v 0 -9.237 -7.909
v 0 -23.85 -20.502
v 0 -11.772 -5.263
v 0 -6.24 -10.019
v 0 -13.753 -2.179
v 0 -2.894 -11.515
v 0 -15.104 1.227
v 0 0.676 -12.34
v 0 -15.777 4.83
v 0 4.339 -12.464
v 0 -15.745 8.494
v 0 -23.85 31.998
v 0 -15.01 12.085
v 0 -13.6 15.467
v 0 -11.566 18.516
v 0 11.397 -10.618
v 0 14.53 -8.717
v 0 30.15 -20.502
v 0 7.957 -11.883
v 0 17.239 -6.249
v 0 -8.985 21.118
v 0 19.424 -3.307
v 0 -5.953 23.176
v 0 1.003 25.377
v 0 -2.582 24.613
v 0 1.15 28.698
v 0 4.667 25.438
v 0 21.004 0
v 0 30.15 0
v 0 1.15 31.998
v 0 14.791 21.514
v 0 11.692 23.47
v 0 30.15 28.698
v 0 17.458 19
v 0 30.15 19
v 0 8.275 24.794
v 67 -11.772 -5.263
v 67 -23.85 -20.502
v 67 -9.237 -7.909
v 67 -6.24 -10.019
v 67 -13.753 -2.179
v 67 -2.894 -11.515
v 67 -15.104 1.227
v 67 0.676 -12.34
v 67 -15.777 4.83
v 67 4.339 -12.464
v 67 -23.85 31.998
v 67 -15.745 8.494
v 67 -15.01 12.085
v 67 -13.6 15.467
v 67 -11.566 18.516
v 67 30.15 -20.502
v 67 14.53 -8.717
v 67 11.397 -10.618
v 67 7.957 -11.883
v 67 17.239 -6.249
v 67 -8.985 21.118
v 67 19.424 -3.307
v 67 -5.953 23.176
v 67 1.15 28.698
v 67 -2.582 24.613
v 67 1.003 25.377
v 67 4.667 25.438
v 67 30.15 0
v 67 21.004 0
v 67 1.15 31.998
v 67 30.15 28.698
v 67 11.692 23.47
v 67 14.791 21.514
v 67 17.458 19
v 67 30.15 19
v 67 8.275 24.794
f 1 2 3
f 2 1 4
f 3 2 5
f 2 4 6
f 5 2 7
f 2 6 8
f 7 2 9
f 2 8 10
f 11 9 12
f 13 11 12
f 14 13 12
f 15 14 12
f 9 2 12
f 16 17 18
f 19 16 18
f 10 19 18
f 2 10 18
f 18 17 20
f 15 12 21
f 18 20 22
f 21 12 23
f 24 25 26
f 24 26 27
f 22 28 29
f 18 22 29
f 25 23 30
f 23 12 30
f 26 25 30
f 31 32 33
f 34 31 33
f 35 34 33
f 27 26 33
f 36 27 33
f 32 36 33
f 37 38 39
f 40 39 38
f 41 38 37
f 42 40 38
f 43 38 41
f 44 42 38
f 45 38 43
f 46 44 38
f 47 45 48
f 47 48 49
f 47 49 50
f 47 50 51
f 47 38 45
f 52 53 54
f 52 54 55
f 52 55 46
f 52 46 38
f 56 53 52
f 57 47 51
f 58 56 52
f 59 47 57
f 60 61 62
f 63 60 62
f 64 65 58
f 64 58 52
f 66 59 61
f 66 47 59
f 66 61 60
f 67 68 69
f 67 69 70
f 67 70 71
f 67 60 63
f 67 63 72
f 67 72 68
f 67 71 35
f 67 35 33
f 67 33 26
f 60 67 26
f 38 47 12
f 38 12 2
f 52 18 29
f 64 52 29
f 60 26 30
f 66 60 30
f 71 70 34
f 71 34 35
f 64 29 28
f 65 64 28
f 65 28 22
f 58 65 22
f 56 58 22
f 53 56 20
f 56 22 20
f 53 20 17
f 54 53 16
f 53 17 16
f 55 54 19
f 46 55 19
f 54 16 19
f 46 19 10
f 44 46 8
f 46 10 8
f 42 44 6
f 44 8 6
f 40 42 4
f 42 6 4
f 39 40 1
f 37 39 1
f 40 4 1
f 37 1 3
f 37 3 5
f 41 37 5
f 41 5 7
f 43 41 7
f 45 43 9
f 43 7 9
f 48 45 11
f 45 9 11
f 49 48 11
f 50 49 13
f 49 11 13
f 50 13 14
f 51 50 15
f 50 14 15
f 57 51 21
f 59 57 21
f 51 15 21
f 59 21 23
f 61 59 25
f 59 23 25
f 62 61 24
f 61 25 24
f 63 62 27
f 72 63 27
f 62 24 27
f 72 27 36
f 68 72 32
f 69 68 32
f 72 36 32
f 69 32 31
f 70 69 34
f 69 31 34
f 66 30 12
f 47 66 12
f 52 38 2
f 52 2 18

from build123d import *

# Parameters (mm, degrees)
F1_DEPTH = 67


# Not quite as in the source:
# - a feature names something its author has since deleted; it is built from what else it names


with BuildPart() as f1:
    # F0 (on Right) → F1 (new body)
    with BuildSketch(Plane.YZ):
        with BuildLine():
            Line((-23.8500006944, 31.9984000194), (-23.8500006944, -20.5015999806))
            Line((-23.8500006944, -20.5015999806), (30.1499993056, -20.5015999806))
            Line((30.1499993056, -20.5015999806), (30.1499993056, 0))
            Line((30.1499993056, 0), (21.0041528052, 0))
            ThreePointArc((21.0041528052, 0), (-15.527421475, 3.0121480227), (17.457689473, 19))
            Line((17.457689473, 19), (30.1499993056, 19))
            Line((30.1499993056, 19), (30.1499993056, 28.6984000194))
            Line((30.1499993056, 28.6984000194), (1.1499993056, 28.6984000194))
            Line((1.1499993056, 28.6984000194), (1.1499993056, 31.9984000194))
            Line((1.1499993056, 31.9984000194), (-23.8500006944, 31.9984000194))
        make_face()
    extrude(amount=F1_DEPTH)


solid = f1.part
